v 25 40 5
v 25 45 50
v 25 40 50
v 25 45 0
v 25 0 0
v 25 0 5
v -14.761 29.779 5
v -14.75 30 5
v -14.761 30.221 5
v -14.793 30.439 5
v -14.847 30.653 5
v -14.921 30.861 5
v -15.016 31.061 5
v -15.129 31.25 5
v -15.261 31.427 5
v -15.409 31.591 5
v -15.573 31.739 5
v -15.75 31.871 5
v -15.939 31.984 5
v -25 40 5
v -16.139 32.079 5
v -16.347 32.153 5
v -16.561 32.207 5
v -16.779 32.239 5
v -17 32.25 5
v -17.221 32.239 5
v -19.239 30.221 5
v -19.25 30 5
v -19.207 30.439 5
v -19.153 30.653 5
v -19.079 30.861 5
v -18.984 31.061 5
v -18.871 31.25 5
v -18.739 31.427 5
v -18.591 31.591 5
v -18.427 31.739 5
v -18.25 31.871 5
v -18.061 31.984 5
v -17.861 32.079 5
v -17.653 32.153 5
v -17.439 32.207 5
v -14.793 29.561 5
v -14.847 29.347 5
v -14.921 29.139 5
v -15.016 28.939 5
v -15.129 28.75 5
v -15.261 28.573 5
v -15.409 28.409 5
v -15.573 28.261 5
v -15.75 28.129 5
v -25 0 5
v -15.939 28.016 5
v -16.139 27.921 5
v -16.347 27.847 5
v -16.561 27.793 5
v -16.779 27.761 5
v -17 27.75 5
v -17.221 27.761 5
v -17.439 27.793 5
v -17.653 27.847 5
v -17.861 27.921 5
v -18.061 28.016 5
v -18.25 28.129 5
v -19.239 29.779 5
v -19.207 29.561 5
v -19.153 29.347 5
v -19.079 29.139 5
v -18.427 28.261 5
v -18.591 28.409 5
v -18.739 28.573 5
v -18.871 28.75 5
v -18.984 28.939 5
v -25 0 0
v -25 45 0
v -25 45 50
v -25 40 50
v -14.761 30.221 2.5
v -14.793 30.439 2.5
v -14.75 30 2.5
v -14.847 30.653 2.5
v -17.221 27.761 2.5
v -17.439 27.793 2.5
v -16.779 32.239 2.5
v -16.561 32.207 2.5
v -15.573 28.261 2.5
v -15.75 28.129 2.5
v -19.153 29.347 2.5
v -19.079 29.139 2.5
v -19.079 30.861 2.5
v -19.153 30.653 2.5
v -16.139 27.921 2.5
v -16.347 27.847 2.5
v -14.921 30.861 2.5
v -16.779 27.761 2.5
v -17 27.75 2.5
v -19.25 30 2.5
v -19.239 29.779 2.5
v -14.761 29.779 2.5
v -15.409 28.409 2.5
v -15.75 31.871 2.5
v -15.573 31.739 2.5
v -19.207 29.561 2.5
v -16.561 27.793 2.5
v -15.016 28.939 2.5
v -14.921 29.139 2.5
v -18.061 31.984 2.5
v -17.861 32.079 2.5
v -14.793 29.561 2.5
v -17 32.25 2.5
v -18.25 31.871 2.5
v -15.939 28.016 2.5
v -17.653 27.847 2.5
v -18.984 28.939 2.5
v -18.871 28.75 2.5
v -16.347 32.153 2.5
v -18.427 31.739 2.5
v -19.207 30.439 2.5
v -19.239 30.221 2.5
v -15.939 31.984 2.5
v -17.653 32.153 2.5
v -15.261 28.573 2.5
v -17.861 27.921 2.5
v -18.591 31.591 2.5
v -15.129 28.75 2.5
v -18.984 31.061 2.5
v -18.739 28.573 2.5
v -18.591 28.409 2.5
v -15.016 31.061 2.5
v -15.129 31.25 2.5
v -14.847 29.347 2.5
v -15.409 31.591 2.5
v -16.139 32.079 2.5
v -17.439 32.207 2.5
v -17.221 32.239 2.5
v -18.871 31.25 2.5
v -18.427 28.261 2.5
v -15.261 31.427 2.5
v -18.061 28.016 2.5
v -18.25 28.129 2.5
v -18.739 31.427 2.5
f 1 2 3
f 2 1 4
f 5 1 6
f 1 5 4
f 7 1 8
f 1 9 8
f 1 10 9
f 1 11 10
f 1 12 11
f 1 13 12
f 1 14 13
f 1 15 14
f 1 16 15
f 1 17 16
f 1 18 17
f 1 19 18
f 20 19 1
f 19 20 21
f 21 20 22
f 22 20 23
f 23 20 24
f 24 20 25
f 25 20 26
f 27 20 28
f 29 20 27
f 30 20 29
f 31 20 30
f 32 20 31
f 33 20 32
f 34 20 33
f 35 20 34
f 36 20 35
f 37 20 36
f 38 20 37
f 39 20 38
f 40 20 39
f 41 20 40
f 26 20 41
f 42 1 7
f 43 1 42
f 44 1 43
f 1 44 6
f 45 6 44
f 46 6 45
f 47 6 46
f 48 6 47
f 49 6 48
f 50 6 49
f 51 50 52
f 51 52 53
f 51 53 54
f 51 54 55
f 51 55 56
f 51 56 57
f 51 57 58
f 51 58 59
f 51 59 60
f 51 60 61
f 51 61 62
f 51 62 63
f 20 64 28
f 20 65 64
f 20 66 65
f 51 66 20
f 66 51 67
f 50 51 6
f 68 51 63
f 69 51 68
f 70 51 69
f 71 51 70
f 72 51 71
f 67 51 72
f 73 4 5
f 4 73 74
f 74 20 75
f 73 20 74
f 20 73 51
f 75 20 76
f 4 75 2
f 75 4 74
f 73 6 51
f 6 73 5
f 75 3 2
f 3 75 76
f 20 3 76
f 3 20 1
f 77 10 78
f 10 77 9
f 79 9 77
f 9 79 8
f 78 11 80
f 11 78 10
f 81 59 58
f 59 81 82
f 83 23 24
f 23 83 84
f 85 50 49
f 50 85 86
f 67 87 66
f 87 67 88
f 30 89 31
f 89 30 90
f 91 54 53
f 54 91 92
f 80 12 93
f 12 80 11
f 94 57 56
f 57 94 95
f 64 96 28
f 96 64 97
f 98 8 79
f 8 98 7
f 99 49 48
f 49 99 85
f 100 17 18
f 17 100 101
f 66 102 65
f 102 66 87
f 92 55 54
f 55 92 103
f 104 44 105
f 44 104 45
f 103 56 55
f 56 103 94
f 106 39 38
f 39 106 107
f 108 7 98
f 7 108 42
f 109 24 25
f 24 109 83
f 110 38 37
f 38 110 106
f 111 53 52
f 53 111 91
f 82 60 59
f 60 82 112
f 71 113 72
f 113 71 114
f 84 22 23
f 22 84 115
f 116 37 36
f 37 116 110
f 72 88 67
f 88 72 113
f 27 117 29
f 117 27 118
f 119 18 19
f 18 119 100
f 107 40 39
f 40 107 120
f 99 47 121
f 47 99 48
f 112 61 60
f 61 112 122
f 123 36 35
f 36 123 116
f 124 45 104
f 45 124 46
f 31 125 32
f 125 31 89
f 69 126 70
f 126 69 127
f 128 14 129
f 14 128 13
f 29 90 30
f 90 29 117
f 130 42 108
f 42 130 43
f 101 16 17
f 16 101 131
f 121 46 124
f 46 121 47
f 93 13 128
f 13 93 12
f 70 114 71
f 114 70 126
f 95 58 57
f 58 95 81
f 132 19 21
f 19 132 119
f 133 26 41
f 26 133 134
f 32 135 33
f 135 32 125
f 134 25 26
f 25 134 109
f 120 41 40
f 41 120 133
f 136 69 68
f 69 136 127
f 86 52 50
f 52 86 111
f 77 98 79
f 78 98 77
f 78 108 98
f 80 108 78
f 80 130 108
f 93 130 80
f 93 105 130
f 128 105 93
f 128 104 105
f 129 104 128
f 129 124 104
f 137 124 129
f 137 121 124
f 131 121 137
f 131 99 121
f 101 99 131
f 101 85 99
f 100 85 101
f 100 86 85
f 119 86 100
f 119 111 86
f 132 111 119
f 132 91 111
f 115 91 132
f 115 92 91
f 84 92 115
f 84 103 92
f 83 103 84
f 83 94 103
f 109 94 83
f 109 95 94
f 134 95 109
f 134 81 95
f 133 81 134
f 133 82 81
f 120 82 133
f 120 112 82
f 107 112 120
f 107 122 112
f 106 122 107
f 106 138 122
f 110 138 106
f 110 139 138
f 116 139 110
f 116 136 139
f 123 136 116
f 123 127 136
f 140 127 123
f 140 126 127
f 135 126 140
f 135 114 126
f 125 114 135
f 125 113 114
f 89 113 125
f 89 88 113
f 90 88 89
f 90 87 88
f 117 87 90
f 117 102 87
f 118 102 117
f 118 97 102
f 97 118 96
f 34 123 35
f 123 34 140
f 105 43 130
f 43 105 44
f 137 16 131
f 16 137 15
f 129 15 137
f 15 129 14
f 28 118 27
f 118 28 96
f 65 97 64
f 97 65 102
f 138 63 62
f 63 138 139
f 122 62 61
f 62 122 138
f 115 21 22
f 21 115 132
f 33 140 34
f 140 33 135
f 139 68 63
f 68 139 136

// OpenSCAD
// L-shaped mounting bracket for NEMA 17 stepper motor
// Print orientation: base plate flat on the bed, motor plate vertical

// ---------- Parameters ----------
plate_x      = 25;    // base plate half-width (X)
plate_y      = 45;    // base plate length (Y)
plate_t      = 5;     // base plate thickness (Z)

motor_h      = 50;    // motor plate height (Z)
motor_w      = 5;     // motor plate thickness (Y)

boss_d       = 23;    // motor boss hole diameter
boss_x       = 0;     // boss hole centre X
boss_z       = 28;    // boss hole centre Z

screw_d      = 3.4;   // M3 screw hole diameter
screw_pitch  = 31;    // square pattern pitch (X and Y)

gusset_t     = 5;     // gusset thickness (X)
gusset_y     = 20;    // gusset leg along Y
gusset_z     = 20;    // gusset leg along Z

eps          = 0.5;   // cutter overshoot past faces
$fn          = 96;    // curve resolution

// ---------- Model ----------
difference() {
    union() {
        // Base plate
        translate([-plate_x, 0, 0])
            cube([plate_x * 2, plate_y, plate_t]);

        // Motor plate, flush with the back edge of the base
        translate([-plate_x, plate_y - motor_w, 0])
            cube([plate_x * 2, motor_w, motor_h]);
    }

    // Base plate through-holes (M4)
    for (z = [plate_t / 2, plate_t - plate_t / 2 + eps])
        translate([-17, 30, z])
            cylinder(d = 4.5, h = plate_t + eps, $fn = 64);

    // Boss hole and screw holes, all in the same (X, Z) plane
    translate([boss_x, plate_y - motor_w - eps, boss_z])
        rotate([90, 0, 0]) {
            cylinder(d = boss_d, h = motor_w + 2 * eps, $fn = 96);
            for (i = [-1, 1])
                for (j = [-1, 1])
                    translate([i * screw_pitch / 2, j * screw_pitch / 2, 0])
                        cylinder(d = screw_d, h = motor_w + 2 * eps, $fn = 64);
        }

    // Triangular gussets, right-angle corner at the plate junction
    for (sx = [-1, 1])
        translate([sx * (plate_x - gusset_t), gusset_y, gusset_z])
            rotate([90, 0, 0])
                linear_extrude(height = gusset_t)
                    polygon(points = [
                        [0, 0],
                        [gusset_y, 0],
                        [0, gusset_z]
                    ]);
}
